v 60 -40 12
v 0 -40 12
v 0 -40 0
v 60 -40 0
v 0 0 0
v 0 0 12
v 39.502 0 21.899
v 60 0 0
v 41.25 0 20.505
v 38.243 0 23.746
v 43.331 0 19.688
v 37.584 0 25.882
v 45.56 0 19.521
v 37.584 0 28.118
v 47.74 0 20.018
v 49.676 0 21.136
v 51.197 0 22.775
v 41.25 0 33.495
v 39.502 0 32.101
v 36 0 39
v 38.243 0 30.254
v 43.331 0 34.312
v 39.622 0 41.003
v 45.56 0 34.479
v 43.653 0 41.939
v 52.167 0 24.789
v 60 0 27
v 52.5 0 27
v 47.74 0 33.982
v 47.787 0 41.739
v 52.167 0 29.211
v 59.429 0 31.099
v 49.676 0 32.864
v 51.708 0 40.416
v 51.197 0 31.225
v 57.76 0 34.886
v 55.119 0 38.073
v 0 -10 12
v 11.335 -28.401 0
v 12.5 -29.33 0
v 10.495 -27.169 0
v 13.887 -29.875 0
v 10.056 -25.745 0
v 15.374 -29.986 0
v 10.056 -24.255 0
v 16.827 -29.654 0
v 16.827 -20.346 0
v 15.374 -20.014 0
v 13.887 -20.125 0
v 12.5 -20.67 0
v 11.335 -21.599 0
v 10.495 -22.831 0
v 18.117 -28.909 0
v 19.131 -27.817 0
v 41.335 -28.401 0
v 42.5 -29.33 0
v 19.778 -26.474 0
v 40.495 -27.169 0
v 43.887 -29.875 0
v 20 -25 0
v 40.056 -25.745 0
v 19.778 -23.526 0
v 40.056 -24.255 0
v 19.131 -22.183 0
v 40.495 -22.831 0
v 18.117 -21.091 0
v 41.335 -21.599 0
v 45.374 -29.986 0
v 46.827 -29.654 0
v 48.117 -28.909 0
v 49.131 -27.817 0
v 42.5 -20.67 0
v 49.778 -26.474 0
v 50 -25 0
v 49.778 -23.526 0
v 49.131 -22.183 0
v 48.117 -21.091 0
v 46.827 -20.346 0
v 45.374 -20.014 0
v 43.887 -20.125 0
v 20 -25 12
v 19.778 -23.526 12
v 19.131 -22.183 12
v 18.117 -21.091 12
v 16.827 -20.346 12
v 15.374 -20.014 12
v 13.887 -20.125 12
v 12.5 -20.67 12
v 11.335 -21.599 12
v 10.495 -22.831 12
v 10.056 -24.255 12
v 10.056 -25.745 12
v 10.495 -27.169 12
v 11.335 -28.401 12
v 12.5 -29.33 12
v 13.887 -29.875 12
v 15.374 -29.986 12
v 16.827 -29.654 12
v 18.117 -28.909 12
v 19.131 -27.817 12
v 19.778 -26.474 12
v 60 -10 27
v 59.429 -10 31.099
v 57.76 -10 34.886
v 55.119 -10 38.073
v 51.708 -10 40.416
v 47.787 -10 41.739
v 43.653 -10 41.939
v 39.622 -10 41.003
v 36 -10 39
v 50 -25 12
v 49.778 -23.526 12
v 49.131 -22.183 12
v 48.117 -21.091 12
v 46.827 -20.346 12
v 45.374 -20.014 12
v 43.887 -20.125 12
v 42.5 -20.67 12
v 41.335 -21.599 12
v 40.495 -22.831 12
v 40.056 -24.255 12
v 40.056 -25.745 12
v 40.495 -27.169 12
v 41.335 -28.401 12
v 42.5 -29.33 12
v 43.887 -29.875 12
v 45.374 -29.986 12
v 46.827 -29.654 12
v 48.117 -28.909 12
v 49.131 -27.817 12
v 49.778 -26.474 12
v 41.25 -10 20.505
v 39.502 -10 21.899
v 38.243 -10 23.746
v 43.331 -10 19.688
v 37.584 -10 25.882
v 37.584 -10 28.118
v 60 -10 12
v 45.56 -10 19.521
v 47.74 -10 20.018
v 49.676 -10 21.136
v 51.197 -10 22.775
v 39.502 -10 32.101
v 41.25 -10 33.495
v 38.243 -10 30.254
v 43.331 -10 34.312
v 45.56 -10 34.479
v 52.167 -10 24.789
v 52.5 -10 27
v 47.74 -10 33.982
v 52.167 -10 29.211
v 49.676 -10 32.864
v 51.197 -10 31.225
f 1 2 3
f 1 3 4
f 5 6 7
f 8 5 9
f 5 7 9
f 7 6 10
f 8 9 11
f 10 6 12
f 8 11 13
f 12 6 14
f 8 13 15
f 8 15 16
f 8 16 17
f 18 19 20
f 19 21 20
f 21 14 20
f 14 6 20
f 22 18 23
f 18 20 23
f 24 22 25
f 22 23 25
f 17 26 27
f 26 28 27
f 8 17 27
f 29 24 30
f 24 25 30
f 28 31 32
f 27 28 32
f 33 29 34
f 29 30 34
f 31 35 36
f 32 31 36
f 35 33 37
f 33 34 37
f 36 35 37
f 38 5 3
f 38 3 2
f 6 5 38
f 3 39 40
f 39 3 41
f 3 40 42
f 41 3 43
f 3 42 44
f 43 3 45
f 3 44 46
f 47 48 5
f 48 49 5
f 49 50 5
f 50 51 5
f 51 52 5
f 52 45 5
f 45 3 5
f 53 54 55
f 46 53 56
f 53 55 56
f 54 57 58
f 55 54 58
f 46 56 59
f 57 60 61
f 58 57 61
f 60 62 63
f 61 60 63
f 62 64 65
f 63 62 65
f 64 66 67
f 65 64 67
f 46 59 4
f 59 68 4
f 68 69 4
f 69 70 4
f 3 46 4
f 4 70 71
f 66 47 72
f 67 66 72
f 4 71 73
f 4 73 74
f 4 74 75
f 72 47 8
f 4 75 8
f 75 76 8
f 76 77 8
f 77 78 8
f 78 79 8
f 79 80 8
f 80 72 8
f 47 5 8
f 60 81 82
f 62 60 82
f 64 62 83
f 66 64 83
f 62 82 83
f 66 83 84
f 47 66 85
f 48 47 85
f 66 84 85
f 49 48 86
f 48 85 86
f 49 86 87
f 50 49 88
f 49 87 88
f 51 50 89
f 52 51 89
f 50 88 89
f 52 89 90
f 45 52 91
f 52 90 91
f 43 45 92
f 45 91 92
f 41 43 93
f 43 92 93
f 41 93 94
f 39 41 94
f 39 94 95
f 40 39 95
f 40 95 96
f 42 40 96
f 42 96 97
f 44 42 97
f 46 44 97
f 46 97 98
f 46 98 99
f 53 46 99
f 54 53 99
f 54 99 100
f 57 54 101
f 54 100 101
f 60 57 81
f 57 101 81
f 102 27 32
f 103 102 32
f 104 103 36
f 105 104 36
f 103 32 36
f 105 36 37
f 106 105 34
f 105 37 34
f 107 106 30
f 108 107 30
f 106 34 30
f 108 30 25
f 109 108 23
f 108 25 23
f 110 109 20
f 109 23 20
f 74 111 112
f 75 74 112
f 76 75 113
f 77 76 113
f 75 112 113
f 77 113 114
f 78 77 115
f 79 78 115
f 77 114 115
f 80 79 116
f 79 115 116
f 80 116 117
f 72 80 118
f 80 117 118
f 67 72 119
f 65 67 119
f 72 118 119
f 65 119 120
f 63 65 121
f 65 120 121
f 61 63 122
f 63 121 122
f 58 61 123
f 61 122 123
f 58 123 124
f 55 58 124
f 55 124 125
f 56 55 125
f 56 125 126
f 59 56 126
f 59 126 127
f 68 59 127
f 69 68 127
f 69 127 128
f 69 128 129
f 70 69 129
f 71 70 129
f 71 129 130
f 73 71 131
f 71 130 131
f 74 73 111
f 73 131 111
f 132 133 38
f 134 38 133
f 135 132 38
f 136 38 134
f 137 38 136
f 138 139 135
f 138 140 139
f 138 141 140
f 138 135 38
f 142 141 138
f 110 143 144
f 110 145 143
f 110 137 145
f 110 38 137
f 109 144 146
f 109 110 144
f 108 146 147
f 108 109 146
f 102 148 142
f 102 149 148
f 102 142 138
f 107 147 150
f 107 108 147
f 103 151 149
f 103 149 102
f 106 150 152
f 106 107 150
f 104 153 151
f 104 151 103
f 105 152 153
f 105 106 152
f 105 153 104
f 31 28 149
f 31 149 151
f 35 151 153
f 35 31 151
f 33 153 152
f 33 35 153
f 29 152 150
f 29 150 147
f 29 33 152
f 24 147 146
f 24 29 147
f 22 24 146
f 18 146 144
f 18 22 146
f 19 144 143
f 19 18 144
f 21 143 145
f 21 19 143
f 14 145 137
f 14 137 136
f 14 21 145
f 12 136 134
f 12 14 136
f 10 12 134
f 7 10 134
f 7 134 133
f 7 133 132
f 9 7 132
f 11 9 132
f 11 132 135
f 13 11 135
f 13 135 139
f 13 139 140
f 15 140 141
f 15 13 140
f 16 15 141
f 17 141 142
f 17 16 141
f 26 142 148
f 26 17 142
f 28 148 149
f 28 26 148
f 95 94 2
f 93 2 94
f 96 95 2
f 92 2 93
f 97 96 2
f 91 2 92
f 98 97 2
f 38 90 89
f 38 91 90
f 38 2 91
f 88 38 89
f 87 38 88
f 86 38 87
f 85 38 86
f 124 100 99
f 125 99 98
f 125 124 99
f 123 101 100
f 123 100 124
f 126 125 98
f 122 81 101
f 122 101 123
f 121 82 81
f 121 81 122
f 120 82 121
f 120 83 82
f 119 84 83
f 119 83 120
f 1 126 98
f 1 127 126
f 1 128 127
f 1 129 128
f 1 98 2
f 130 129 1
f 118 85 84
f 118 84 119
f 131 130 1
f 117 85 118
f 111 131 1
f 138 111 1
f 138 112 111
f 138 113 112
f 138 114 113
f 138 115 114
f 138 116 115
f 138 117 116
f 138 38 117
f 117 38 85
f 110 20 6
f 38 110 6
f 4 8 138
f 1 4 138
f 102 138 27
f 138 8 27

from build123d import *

# Parameters (mm, degrees)
F0_W     = 60
F0_H     = 12
F1_DEPTH = 40
F0_R     = 7.5
F2_DEPTH = 10
F3_R     = 5
F4_DEPTH = 12


with BuildPart() as f1:
    # F0 (on Front) → F1 (new body)
    with BuildSketch(Plane.XZ):
        with Locations((30, 6)):
            Rectangle(F0_W, F0_H)
    extrude(amount=F1_DEPTH)

    # F0 (on Front) → F2 (join)
    with BuildSketch(Plane.XZ):
        with BuildLine():
            Line((36, 39), (0, 12))
            Line((0, 12), (60, 12))
            Line((60, 12), (60, 27))
            ThreePointArc((60, 27), (51.708204, 40.416408), (36, 39))
        make_face()
        with Locations((45, 27)):
            Circle(F0_R, mode=Mode.SUBTRACT)
    extrude(amount=F2_DEPTH)

    # F3 (on face) → F4 (cut, through all)
    with BuildSketch(Plane.XY.offset(12)):
        with Locations((15, -25)):
            Circle(F3_R)
        with Locations((45, -25)):
            Circle(F3_R)
    extrude(amount=-F4_DEPTH, mode=Mode.SUBTRACT)


solid = f1.part
